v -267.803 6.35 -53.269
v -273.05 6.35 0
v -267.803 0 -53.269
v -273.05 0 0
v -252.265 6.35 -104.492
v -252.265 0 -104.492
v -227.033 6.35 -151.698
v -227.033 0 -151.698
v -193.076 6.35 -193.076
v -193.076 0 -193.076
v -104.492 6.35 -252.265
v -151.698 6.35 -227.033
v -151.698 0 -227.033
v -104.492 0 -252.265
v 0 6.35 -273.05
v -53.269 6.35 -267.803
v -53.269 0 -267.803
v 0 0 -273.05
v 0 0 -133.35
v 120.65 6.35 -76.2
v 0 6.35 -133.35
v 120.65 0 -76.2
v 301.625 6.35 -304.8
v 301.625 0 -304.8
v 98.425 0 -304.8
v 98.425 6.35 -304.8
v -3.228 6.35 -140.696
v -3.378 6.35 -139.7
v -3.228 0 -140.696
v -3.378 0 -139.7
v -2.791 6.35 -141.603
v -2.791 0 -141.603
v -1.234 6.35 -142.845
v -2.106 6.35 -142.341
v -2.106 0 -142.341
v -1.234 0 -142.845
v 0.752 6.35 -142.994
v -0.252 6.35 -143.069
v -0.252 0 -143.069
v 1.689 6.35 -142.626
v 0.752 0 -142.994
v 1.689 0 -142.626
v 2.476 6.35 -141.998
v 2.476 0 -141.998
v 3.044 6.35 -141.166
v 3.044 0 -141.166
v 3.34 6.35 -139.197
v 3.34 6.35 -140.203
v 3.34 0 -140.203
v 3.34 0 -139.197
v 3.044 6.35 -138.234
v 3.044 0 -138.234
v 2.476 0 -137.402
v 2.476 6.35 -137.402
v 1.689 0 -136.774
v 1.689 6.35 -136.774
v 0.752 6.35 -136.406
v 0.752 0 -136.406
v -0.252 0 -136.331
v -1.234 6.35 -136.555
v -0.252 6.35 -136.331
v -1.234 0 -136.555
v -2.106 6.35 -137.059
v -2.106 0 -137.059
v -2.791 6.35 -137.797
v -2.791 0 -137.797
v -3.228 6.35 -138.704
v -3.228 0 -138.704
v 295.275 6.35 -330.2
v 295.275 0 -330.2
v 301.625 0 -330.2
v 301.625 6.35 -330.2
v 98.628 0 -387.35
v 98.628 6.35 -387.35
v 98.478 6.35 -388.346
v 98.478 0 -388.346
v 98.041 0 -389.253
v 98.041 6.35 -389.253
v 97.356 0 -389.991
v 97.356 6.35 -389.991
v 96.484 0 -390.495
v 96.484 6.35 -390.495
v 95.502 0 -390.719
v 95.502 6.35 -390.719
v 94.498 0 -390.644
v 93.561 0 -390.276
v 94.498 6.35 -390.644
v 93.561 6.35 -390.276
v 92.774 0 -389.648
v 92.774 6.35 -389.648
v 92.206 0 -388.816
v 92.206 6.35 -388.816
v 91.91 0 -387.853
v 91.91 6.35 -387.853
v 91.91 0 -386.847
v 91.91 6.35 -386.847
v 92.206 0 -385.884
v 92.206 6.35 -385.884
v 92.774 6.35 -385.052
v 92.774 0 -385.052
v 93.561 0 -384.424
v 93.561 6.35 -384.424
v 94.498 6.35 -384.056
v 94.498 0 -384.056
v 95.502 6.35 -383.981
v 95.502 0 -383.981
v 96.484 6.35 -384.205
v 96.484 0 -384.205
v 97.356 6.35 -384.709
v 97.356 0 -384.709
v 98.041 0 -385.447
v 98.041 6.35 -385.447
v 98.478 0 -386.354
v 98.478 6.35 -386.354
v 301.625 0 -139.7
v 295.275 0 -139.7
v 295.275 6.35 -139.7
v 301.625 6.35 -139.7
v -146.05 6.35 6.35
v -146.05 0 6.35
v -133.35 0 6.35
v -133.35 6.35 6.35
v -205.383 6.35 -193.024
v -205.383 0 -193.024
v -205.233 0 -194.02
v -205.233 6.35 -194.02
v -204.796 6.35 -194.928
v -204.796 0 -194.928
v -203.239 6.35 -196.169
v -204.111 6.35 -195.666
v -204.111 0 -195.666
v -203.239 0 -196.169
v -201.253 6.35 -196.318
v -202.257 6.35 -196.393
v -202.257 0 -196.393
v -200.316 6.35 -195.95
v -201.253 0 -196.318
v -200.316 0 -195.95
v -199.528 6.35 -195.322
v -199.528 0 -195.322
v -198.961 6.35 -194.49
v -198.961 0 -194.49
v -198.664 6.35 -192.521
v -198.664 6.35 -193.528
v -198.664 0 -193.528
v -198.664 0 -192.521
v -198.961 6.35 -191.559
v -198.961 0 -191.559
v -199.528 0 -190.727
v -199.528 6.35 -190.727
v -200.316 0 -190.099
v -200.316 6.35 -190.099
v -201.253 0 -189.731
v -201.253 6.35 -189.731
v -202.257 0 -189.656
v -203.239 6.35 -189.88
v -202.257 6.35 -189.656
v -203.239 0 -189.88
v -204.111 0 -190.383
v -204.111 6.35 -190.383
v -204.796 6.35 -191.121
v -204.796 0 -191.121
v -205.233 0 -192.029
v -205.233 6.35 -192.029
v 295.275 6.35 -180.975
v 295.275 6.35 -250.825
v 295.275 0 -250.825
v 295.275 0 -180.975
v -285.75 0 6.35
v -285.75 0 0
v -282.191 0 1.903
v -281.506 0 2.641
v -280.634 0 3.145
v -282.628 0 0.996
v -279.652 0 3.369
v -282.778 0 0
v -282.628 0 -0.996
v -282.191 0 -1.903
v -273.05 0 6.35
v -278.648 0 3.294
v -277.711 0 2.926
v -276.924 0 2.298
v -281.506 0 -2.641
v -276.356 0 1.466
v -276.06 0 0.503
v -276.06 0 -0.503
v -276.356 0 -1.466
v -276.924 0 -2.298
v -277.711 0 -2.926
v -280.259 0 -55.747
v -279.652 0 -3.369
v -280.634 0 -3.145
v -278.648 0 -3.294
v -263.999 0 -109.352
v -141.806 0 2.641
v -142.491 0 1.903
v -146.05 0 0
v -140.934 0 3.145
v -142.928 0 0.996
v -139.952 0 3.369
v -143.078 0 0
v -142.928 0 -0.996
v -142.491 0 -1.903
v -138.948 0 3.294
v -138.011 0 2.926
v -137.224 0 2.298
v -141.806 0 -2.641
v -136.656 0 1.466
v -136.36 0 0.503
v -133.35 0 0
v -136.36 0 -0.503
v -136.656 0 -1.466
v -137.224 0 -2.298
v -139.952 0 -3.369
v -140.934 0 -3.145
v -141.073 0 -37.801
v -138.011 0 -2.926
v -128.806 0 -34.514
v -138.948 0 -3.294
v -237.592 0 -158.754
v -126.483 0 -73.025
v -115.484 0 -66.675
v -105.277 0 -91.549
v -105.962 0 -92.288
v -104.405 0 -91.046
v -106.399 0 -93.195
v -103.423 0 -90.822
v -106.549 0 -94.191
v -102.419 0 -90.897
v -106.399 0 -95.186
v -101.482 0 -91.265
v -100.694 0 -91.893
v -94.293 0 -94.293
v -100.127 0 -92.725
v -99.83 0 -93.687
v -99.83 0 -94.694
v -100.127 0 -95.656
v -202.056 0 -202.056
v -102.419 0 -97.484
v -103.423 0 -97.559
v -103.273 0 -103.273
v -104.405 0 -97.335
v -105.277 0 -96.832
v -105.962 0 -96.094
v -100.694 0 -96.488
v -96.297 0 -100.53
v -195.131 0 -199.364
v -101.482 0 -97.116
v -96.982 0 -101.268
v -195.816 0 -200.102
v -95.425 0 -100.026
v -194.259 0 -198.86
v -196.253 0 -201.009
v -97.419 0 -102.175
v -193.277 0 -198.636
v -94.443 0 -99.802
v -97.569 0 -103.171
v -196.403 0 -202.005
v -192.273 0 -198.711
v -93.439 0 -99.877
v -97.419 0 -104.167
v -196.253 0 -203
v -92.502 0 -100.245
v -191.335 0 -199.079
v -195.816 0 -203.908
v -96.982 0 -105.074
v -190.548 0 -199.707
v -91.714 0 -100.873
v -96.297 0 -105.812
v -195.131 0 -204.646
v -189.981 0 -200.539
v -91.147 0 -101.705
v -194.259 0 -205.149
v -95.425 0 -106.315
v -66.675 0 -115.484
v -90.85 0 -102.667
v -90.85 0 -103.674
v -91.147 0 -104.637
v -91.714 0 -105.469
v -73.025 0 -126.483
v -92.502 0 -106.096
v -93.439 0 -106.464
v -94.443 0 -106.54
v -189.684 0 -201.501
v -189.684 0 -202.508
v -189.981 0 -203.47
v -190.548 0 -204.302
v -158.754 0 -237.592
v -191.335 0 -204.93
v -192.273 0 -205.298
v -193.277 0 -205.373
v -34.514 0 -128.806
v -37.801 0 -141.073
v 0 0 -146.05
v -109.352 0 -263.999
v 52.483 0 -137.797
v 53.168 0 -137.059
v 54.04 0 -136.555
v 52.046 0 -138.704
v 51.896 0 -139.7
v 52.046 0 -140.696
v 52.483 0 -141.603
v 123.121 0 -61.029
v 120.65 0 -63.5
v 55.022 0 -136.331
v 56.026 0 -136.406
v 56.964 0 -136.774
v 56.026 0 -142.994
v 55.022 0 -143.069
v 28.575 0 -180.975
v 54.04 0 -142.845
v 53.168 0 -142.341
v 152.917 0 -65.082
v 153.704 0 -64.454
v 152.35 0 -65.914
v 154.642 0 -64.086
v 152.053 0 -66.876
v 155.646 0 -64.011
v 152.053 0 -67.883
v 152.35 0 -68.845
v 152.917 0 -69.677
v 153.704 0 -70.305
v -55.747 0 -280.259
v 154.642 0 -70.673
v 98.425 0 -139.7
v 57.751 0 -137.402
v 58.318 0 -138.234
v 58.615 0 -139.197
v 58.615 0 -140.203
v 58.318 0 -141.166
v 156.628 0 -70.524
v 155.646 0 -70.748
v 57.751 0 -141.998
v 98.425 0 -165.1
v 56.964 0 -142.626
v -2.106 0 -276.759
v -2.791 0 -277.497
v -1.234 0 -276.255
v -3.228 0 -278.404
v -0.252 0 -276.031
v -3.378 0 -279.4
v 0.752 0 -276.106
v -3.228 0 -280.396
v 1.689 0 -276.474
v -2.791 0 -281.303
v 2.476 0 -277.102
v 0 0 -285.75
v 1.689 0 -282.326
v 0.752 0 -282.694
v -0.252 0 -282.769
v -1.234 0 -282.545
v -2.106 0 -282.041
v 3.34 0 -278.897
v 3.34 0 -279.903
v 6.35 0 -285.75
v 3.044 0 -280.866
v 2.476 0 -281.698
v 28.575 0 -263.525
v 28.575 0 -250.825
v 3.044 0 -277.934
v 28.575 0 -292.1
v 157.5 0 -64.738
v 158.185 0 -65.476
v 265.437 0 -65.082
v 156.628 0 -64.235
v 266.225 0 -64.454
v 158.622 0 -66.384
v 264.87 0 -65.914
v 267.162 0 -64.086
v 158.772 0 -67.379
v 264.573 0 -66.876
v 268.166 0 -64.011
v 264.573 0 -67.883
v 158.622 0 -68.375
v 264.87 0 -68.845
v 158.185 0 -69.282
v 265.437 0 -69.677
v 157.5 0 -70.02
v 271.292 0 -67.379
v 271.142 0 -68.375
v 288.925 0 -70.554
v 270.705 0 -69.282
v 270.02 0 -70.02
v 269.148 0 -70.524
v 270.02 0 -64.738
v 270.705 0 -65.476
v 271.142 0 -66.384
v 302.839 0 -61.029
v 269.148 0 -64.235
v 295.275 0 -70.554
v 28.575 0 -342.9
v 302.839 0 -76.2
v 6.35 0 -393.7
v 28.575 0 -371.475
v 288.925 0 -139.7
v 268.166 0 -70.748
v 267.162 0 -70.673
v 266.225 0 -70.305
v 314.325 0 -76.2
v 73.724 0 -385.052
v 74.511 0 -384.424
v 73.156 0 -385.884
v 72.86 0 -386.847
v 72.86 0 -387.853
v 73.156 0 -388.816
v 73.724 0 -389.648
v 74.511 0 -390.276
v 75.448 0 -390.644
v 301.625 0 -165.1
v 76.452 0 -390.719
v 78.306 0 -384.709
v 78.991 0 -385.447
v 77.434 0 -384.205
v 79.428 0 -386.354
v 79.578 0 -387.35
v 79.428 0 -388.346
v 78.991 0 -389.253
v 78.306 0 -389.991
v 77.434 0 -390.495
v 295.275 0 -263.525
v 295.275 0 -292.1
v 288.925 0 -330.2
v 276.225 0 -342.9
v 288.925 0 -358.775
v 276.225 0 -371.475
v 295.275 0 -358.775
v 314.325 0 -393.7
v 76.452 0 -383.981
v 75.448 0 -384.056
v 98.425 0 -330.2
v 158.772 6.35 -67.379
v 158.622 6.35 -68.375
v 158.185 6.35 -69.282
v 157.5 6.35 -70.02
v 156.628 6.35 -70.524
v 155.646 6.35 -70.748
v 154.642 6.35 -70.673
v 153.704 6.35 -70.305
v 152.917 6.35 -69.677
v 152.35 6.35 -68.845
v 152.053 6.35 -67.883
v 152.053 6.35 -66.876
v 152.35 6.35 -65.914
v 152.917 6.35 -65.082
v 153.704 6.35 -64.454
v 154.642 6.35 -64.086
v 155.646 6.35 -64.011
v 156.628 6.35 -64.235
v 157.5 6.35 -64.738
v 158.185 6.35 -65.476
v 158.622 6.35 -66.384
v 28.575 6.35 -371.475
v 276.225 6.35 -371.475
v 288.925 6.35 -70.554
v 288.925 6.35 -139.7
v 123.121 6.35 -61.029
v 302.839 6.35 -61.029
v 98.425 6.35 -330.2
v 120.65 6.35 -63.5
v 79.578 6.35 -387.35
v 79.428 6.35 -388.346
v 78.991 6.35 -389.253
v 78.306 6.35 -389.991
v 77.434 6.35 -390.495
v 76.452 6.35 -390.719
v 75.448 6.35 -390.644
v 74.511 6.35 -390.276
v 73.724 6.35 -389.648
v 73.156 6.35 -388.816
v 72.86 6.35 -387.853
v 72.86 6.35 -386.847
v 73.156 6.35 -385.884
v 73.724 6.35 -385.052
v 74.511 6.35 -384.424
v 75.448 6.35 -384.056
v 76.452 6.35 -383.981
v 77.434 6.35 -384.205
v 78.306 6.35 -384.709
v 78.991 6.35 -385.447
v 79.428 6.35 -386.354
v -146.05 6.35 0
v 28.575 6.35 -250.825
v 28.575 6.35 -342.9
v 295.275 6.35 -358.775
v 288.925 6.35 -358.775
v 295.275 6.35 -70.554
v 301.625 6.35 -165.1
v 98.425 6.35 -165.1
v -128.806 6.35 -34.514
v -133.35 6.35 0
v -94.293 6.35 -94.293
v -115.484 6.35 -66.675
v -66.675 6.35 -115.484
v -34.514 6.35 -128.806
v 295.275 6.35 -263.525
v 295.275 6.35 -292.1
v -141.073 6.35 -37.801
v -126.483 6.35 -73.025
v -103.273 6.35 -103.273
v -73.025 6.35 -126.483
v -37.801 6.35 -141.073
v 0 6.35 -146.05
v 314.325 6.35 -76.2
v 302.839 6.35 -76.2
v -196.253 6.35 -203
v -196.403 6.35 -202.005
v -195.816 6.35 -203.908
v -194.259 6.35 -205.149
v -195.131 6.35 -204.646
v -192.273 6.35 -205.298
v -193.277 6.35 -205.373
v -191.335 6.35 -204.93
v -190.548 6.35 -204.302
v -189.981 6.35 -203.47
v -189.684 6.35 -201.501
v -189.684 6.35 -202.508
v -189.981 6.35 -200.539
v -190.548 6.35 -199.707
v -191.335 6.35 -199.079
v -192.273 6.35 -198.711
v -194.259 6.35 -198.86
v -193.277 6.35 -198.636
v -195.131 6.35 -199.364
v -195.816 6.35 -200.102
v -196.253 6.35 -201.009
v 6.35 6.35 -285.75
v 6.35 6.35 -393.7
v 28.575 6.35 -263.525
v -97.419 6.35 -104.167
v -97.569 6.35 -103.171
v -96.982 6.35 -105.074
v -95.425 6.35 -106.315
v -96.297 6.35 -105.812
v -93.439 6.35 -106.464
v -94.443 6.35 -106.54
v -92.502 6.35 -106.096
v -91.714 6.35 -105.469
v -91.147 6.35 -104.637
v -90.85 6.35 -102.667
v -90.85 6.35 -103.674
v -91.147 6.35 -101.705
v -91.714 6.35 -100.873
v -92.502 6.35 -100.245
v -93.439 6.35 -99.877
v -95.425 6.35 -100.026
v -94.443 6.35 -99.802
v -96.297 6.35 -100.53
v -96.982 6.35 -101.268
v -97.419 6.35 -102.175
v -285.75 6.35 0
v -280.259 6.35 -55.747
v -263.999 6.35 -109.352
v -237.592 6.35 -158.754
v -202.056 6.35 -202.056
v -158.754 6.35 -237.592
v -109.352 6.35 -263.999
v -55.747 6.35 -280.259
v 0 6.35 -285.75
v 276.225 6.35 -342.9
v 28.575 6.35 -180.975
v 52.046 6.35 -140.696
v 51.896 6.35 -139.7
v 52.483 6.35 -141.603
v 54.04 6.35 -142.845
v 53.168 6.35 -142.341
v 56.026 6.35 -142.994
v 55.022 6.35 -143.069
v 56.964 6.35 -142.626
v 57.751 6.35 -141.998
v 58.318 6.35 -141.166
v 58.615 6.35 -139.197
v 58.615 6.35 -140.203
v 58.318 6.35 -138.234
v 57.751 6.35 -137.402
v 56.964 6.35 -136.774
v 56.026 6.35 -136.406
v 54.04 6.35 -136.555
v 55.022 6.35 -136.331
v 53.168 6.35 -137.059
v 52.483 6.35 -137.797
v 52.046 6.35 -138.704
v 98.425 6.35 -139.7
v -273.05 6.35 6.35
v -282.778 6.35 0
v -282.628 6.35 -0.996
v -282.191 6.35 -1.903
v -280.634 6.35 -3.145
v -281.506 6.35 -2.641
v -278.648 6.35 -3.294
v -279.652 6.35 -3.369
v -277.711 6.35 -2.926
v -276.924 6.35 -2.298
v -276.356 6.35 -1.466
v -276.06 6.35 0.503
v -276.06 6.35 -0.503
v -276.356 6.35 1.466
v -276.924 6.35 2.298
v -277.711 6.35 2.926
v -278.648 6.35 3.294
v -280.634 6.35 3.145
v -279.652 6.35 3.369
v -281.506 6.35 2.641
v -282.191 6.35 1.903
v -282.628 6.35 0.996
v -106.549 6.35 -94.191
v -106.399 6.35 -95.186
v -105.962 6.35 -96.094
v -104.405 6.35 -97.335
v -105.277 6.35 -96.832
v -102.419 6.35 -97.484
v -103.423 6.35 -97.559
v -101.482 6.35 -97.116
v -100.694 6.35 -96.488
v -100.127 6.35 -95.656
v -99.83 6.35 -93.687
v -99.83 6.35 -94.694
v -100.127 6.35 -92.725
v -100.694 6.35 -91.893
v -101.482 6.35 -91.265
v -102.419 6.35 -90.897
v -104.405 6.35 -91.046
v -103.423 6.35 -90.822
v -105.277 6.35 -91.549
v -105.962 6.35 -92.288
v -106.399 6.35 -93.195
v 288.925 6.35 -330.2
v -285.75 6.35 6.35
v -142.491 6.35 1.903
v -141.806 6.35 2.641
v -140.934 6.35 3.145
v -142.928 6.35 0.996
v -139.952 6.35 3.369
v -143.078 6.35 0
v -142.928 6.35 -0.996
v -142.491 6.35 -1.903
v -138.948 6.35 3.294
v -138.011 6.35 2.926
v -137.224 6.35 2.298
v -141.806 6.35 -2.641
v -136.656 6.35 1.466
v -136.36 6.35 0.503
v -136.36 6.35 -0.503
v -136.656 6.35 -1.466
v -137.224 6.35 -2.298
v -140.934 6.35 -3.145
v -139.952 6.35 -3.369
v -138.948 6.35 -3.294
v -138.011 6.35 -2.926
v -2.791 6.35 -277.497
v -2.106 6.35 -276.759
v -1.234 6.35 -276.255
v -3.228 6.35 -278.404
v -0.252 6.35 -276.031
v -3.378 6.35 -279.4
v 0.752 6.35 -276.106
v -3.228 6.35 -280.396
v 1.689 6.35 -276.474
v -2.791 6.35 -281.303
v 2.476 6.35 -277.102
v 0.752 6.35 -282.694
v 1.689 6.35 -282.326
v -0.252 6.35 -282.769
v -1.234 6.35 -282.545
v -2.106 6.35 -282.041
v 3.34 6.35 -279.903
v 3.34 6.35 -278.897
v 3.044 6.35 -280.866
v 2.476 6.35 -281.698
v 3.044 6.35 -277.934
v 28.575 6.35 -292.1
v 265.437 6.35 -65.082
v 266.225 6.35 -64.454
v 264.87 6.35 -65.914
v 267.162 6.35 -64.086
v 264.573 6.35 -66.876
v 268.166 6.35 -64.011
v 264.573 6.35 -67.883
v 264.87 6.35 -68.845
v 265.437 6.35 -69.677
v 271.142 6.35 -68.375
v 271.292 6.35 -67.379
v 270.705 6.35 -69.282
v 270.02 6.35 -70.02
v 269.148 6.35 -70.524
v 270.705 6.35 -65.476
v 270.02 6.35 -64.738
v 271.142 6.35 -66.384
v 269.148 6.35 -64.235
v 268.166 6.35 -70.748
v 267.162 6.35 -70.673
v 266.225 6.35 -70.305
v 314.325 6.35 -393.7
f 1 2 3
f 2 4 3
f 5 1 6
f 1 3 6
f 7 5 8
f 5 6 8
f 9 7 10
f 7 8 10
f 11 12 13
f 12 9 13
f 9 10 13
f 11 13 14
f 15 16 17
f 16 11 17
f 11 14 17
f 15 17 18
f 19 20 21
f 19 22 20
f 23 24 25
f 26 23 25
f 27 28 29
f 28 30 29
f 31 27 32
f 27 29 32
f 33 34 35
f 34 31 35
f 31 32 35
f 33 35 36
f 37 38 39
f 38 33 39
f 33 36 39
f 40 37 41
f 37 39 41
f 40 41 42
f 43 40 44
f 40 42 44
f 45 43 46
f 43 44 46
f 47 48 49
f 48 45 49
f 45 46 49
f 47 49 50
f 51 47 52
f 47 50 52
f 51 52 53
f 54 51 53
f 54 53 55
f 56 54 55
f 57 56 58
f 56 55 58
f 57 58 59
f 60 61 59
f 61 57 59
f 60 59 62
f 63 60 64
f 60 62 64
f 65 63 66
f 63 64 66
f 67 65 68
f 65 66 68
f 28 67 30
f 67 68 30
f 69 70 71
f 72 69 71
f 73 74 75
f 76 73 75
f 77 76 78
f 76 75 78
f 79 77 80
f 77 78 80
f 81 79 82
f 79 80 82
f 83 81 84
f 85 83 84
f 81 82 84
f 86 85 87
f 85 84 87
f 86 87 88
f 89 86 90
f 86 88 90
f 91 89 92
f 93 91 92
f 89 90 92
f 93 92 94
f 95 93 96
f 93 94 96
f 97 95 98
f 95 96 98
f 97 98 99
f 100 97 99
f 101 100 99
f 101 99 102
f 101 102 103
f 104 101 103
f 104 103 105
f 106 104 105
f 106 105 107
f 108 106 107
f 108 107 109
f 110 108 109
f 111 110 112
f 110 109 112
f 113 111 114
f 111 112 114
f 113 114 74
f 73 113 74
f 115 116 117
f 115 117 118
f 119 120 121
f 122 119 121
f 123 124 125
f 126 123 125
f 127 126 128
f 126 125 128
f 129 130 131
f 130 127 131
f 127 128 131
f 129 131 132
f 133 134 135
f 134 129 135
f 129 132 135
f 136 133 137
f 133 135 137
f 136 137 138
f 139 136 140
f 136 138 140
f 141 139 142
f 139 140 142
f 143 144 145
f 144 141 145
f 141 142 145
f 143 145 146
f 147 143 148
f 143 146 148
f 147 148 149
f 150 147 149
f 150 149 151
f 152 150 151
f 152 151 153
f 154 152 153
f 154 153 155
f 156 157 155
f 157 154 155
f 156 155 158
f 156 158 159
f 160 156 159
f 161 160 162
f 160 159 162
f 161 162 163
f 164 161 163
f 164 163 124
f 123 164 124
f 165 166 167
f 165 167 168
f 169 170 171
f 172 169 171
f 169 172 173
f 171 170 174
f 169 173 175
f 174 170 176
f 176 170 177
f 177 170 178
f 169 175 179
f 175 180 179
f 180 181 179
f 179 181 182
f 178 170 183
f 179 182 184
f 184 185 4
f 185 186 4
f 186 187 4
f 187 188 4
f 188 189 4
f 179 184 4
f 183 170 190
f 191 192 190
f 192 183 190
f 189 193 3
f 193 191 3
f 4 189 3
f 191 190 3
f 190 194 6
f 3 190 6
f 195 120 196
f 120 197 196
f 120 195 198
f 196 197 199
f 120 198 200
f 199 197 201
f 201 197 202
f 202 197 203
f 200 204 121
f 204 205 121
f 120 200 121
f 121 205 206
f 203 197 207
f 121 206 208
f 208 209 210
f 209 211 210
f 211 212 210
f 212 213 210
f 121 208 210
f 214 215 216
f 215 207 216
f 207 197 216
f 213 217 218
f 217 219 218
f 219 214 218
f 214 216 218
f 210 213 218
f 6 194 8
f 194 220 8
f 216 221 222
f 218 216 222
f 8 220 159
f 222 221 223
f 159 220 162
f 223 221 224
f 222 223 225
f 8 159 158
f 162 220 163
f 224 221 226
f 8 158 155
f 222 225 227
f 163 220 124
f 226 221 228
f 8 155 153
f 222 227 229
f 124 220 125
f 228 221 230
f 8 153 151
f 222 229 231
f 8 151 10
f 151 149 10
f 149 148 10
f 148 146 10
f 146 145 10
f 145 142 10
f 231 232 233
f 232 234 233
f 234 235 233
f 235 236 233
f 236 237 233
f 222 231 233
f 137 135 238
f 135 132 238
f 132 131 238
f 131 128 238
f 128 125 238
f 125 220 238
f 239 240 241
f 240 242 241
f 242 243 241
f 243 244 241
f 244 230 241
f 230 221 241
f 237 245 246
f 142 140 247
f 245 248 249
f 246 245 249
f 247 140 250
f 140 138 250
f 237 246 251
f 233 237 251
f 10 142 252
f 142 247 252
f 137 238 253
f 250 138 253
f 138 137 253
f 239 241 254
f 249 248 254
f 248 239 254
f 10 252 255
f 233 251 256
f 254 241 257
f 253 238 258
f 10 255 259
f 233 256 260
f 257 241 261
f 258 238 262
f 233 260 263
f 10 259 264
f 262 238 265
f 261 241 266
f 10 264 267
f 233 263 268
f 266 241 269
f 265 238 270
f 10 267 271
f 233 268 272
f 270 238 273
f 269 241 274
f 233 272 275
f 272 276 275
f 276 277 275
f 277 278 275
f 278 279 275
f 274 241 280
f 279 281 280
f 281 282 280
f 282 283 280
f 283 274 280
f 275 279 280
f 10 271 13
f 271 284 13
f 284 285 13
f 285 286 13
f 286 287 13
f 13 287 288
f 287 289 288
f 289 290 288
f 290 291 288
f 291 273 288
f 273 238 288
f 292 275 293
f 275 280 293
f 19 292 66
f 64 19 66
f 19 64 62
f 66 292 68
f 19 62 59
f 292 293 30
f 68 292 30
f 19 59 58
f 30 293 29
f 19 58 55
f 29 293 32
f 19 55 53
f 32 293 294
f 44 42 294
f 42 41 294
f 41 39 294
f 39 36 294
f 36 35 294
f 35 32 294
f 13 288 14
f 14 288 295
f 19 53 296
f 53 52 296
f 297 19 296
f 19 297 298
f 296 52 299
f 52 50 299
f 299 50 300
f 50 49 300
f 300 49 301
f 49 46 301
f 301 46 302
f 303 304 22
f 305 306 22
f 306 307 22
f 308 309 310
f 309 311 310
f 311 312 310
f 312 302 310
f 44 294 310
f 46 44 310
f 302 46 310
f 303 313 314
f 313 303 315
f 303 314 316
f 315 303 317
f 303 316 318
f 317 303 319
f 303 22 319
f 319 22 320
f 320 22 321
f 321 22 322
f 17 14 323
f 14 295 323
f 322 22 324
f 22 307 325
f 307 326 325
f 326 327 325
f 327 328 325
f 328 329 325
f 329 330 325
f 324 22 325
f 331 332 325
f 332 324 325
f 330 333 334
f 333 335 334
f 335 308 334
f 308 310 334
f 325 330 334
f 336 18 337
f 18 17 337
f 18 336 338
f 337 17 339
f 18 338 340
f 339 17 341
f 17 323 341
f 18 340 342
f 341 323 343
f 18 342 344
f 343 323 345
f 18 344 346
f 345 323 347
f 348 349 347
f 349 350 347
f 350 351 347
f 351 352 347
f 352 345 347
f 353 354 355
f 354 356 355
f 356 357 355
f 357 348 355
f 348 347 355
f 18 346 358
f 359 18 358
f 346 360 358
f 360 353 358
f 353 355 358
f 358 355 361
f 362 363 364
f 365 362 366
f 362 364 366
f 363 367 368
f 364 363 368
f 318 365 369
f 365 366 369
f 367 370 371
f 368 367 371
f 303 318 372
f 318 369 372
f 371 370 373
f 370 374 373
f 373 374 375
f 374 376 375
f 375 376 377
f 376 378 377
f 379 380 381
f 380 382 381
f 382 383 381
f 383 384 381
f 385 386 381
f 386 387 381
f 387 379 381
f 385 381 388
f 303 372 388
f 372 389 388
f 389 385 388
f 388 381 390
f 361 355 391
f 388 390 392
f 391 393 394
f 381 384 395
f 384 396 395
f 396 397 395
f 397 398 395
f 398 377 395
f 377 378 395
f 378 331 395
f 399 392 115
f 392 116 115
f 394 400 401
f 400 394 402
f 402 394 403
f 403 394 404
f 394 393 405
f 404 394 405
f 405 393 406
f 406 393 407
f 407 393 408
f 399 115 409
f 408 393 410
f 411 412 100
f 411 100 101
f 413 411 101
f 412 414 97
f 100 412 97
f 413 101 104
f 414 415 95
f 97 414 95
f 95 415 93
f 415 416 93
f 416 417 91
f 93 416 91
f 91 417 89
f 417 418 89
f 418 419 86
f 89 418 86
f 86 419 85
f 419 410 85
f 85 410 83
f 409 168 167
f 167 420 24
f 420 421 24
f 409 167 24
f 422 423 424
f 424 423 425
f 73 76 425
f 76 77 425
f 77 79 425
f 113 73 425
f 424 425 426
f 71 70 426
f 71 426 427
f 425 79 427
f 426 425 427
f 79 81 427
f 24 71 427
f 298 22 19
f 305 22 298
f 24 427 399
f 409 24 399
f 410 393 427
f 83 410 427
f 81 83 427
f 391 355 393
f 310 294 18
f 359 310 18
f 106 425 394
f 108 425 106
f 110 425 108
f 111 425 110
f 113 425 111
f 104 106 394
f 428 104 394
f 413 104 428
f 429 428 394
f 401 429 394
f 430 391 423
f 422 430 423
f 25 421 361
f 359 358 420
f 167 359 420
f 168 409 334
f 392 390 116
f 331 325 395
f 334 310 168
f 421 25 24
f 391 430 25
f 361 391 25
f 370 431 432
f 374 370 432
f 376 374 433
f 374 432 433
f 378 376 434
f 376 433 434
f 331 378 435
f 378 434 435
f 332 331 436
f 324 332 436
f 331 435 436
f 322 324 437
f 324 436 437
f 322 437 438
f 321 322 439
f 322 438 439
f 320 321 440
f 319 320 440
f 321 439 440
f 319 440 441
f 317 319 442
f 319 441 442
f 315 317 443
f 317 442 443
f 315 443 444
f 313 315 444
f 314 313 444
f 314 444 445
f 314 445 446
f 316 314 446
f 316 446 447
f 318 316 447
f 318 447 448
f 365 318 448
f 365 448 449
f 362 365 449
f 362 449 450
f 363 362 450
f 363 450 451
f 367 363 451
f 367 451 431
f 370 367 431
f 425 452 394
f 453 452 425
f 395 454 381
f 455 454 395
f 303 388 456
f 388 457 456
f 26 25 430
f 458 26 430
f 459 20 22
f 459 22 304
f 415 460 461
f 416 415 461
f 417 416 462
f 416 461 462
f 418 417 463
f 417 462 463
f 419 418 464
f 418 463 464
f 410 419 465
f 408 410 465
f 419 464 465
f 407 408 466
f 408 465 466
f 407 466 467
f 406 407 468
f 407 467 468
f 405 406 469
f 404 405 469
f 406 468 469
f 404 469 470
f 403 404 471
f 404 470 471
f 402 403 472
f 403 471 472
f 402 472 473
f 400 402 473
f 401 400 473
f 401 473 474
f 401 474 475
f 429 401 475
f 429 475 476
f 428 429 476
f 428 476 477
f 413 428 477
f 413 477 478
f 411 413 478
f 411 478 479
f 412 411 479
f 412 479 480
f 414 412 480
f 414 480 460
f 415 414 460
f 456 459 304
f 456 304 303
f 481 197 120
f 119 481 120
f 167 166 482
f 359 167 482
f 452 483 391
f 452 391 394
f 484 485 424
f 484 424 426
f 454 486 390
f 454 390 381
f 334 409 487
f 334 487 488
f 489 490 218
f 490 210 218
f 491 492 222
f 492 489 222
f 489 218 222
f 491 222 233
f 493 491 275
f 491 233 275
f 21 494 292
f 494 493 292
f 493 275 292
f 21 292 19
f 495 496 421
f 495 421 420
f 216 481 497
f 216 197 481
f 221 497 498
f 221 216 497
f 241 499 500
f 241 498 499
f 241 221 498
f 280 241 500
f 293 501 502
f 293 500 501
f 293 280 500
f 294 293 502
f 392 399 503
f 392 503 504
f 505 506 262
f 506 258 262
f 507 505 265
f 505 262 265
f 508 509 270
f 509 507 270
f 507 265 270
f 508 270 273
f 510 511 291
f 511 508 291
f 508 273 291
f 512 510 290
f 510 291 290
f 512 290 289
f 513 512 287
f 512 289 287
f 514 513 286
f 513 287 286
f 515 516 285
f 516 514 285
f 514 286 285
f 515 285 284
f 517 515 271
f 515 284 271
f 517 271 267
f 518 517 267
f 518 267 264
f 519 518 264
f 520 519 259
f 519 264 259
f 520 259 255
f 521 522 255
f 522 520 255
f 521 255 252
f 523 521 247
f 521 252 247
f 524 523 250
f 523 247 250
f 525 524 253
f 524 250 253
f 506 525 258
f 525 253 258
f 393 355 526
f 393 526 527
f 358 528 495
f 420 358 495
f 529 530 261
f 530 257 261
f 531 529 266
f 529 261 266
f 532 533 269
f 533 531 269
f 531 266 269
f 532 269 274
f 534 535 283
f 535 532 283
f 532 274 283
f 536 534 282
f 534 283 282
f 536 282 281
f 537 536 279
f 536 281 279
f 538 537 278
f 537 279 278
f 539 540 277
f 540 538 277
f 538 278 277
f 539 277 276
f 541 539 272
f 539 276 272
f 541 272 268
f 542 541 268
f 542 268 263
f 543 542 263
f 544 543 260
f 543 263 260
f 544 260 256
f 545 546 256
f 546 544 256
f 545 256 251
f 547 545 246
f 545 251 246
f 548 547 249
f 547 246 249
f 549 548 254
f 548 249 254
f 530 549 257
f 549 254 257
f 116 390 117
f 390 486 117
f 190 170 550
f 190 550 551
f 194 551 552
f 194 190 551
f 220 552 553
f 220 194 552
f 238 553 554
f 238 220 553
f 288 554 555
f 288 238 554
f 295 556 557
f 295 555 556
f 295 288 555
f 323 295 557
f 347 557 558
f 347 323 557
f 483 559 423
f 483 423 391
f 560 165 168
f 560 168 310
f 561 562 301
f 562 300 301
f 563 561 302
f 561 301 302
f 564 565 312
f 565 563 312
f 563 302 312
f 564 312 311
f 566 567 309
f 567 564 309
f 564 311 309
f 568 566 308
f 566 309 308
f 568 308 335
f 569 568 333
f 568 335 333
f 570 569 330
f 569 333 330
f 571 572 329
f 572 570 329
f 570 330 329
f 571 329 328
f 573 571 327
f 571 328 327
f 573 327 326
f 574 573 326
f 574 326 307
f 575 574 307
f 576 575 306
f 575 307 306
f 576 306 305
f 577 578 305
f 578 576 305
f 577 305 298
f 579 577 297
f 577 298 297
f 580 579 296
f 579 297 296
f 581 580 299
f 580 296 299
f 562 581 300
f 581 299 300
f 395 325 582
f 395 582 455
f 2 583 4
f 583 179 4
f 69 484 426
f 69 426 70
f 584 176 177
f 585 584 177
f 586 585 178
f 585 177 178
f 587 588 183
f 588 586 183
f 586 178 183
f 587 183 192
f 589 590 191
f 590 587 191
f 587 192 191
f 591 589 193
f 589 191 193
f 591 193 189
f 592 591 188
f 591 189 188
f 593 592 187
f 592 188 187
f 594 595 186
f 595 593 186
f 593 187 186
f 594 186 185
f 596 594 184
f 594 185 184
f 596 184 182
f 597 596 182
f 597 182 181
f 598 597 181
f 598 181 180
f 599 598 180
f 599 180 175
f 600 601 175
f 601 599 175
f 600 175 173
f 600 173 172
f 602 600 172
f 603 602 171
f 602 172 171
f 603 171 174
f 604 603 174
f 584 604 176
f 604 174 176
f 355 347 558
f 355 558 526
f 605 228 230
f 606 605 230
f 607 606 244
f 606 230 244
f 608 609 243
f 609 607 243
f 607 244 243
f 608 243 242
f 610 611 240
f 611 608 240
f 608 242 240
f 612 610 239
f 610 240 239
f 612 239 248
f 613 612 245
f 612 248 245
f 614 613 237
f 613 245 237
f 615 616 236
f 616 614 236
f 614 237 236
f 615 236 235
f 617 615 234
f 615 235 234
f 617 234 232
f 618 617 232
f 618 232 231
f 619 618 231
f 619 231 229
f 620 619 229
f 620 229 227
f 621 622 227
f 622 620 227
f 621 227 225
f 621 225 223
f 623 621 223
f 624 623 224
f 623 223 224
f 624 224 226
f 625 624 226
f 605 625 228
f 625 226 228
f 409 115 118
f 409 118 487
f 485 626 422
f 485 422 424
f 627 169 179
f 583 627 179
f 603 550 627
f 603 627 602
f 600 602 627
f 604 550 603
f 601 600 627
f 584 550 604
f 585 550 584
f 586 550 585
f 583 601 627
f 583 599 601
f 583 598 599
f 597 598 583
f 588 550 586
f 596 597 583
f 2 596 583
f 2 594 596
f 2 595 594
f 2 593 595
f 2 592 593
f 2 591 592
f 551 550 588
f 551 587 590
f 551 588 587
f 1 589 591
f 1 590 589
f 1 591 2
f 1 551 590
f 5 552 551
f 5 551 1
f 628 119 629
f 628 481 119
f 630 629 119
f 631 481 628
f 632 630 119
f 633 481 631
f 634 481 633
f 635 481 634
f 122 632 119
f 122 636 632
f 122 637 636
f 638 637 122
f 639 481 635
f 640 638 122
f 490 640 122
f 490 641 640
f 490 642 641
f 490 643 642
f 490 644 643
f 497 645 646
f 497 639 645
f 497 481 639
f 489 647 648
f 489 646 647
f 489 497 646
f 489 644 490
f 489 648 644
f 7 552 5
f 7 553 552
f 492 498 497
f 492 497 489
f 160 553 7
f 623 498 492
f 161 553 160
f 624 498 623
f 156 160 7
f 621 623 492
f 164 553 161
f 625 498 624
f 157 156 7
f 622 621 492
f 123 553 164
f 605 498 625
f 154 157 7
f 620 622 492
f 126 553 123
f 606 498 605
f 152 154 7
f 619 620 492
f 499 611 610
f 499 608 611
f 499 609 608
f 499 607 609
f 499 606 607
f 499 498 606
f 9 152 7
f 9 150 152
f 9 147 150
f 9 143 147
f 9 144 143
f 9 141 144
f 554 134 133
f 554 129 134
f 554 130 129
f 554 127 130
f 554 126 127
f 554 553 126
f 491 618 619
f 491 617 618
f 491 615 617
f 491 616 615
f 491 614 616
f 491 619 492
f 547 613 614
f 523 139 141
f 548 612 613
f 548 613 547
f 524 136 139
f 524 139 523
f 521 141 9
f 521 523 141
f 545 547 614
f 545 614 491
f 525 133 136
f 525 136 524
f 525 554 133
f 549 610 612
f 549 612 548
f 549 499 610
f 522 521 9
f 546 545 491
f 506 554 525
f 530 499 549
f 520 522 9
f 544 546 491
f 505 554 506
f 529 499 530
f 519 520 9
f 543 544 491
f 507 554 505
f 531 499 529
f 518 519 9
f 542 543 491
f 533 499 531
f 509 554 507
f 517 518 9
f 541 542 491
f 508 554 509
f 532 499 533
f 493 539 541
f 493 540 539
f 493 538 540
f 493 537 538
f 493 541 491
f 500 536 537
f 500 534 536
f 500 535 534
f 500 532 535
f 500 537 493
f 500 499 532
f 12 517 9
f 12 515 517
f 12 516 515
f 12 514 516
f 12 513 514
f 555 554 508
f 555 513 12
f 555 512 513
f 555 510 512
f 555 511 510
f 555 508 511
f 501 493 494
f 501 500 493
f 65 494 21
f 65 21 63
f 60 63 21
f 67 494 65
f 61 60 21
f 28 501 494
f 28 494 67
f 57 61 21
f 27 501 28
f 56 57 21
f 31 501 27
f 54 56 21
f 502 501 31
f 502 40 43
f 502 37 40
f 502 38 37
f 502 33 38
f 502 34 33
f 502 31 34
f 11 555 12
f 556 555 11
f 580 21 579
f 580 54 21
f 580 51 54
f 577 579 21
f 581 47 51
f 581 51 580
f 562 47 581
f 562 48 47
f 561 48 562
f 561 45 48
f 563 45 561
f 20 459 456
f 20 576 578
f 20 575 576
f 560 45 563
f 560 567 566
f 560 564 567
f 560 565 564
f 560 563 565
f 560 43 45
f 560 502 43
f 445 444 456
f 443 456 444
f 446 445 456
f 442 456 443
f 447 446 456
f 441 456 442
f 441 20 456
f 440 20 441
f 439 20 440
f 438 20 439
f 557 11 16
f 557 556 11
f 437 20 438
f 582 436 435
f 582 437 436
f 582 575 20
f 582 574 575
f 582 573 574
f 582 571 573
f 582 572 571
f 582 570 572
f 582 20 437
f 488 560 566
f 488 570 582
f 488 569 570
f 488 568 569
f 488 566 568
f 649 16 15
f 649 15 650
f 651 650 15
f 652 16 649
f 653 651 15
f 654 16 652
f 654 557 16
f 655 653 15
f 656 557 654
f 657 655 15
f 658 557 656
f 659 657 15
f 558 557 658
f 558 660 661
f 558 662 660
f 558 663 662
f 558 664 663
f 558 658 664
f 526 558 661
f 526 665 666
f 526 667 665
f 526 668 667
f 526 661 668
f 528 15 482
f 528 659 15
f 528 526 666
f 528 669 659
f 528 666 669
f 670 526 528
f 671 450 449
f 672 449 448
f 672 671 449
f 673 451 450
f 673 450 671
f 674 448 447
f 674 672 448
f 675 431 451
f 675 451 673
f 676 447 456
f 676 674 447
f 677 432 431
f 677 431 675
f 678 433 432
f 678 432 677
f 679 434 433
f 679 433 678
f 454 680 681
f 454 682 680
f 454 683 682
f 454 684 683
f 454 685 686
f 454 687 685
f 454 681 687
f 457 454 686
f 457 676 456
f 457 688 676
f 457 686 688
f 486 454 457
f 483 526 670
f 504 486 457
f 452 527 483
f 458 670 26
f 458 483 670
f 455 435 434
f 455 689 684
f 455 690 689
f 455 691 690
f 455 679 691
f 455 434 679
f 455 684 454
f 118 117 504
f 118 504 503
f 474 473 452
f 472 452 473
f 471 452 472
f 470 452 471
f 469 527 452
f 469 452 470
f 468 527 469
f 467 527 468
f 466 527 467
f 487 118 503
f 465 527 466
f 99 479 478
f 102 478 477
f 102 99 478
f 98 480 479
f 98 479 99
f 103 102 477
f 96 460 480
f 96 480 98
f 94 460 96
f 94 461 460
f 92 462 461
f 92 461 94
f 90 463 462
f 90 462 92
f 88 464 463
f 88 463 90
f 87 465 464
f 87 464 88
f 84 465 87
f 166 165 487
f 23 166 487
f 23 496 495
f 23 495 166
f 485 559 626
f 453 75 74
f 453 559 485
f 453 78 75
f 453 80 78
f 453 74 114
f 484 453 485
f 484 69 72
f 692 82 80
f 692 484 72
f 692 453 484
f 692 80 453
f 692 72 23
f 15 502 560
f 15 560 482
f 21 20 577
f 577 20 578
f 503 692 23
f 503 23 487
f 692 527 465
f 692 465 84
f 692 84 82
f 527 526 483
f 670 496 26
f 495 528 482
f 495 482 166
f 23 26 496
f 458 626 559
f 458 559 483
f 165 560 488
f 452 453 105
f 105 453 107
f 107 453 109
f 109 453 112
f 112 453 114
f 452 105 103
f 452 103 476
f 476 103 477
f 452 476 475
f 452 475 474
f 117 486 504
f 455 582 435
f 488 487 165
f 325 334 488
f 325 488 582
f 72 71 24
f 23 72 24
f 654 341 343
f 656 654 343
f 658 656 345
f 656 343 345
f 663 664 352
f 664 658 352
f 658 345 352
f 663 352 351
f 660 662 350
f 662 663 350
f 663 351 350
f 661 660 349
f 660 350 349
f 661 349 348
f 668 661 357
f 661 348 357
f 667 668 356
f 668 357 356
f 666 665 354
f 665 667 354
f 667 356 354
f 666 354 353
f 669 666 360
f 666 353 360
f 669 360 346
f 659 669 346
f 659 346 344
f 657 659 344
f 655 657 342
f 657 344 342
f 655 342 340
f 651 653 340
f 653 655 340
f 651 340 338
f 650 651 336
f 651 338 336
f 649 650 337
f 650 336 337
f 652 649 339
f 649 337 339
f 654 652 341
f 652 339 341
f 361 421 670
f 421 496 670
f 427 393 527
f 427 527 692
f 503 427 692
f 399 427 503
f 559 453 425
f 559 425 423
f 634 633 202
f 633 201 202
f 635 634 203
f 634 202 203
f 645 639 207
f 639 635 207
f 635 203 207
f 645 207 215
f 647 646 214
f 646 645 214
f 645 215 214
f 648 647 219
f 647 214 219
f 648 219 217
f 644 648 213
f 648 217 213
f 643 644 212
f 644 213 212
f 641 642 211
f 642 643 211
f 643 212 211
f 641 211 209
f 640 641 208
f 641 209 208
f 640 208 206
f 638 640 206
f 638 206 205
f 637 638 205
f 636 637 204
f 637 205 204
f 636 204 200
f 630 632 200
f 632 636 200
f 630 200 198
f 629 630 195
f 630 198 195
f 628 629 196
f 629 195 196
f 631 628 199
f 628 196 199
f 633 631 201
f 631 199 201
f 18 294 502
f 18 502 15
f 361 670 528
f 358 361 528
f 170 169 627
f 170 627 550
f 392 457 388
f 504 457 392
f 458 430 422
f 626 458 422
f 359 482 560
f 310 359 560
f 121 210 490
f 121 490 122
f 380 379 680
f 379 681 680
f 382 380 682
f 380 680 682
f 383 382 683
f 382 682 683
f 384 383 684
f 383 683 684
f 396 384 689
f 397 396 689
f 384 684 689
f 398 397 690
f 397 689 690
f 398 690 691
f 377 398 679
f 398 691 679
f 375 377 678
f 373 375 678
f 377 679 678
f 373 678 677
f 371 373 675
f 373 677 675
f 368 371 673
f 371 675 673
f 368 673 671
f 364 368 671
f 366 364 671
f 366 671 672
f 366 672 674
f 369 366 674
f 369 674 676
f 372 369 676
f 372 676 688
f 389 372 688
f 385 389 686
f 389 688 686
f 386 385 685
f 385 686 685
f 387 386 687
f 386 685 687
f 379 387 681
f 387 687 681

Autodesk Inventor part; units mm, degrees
ref_plane "YZ Plane" through (0, 0, 0) normal (1, 0, 0) x (0, 1, 0)
ref_plane "XZ Plane" through (0, 0, 0) normal (0, 1, 0) x (-1, 0, 0)
ref_plane "XY Plane" through (0, 0, 0) normal (0, 0, 1) x (1, 0, 0)
sketch "Sketch1" plane through (0, 0, 0) normal (0, 1, 0) x (-1, 0, 0)
  arc A0 (0, -273.05) -> (273.05, 0) centre (0, 0) ccw
  arc A1 (0, -285.75) -> (285.75, 0) centre (0, 0) ccw
  arc A2 (0, -146.05) -> (146.05, 0) centre (0, 0) ccw
  arc A3 (0, -133.35) -> (133.35, 0) centre (0, 0) ccw
  line L0 (0, -285.75) -> (-6.35, -285.75)
  line L1 (146.05, 0) -> (146.05, 6.35)
  line L2 (133.35, 0) -> (133.35, 6.35)
  line L3 (273.05, 6.35) -> (273.05, 0)
  line L4 (285.75, 6.35) -> (285.75, 0)
  circle A4 centre (103.1708, -94.1906) radius 3.3782
  circle A5 centre (94.1906, -103.1708) radius 3.3782
  circle A6 centre (279.4, 0) radius 3.3782
  circle A7 centre (139.7, 0) radius 3.3782
  circle A8 centre (202.0047, -193.0245) radius 3.3782
  circle A9 centre (193.0245, -202.0047) radius 3.3782
  circle A10 centre (0, -279.4) radius 3.3782
  circle A11 centre (0, -139.7) radius 3.3782
  circle A12 centre (-55.2746, -139.7) radius 3.3782
  circle A13 centre (-78.3684, -279.4) radius 3.3782
  line L5 (285.75, 6.35) -> (273.05, 6.35)
  line L6 (146.05, 6.35) -> (133.35, 6.35)
  line L7 (-314.96, -285.75) -> (-314.96, -273.05)
  line L8 (-101.6, -133.35) -> (-127, -133.35)
  line L9 (-127, -146.05) -> (-101.6, -146.05)
  line L10 (-314.96, -146.05) -> (-314.96, -133.35)
  line L11 (-6.35, -285.75) -> (-6.35, -393.7)
  line L12 (-6.35, -393.7) -> (-314.325, -393.7)
  line L13 (-314.325, -393.7) -> (-314.325, -76.2)
  line L14 (-314.325, -76.2) -> (-120.65, -76.2)
  line L15 (-120.65, -76.2) -> (0, -133.35)
  line L16 (0, -285.75) -> (-6.35, -285.75)
  line L17 (0, -146.05) -> (0, -273.05)
  dimension "d10" = 12.7
  dimension "d11" = 12.7
  dimension "d13" = 12.7
  dimension "d14" = 6.7564
  dimension "d15" = 6.7564
  dimension "d16" = 6.7564
  dimension "d18" = 6.7564
  dimension "d20" = 6.35
  dimension "d21" = 6.7564
  dimension "d22" = 6.7564
  dimension "d23" = 6.7564
  dimension "d26" = 6.7564
  dimension "d30" = 6.7564
  dimension "d32" = 6.7564
  dimension "d66" = 25.4
  dimension "d67" = 0
  dimension "d72" = 12.7
  dimension "d81" = 107.95
  dimension "d82" = 133.35
  dimension "d83" = 279.4
  dimension "d84" = 6.35
  dimension "d85" = 317.5
  dimension "d86" = 193.675
  dimension "d87" = 55.2746
  dimension "d88" = 139.7
  dimension "d91" = 307.975
extrude "Extrusion7" add sketch "Sketch1" along normal blind 6.35
sketch "Sketch7" plane through (0, 0, 0) normal (0, -1, 0) x (1, 0, 0)
  line L0 (0, -273.05) -> (0, -146.05) projected
  line L1 (314.325, -76.2) -> (314.325, -393.7) projected
  line L2 (314.325, -234.95) -> (0, -234.95)
  line L3 (301.625, -139.7) -> (301.625, -165.1)
  line L4 (301.625, -165.1) -> (98.425, -165.1)
  line L5 (98.425, -165.1) -> (98.425, -139.7)
  line L6 (98.425, -139.7) -> (301.625, -139.7)
  line L7 (301.625, -330.2) -> (301.625, -304.8)
  line L8 (301.625, -304.8) -> (98.425, -304.8)
  line L9 (98.425, -304.8) -> (98.425, -330.2)
  line L10 (98.425, -330.2) -> (301.625, -330.2)
  dimension "d92" = 25.4
  dimension "d93" = 203.2
  dimension "d94" = 12.7
  dimension "d95" = 69.85
extrude "Extrusion8" cut sketch "Sketch7" against normal blind 6.35
sketch "Sketch8" plane through (0, 6.35, 0) normal (0, 1, 0) x (1, 0, 0)
  line L0 (98.425, 165.1) -> (301.625, 165.1) projected
  line L1 (301.625, 304.8) -> (98.425, 304.8) projected
  circle A0 centre (78.3684, 279.4) radius 3.3782 projected
  line L2 (314.325, 76.2) -> (314.325, 393.7) projected
  line L3 (314.325, 393.7) -> (6.35, 393.7) projected
  line L4 (0, 273.05) -> (0, 146.05) projected
  line L5 (295.275, 367.3082) -> (295.275, 342.9)
  line L6 (295.275, 342.9) -> (28.575, 342.9)
  line L7 (28.575, 342.9) -> (28.575, 371.475)
  line L8 (28.575, 371.475) -> (295.275, 371.475)
  line L9 (295.275, 371.475) -> (295.275, 367.3082)
  line L10 (295.275, 292.1) -> (28.575, 292.1)
  line L11 (28.575, 292.1) -> (28.575, 263.525)
  line L12 (28.575, 263.525) -> (295.275, 263.525)
  line L13 (295.275, 263.525) -> (295.275, 292.1)
  line L14 (295.275, 250.825) -> (28.575, 250.825)
  line L15 (28.575, 250.825) -> (28.575, 222.25)
  line L16 (28.575, 222.25) -> (295.275, 222.25)
  line L17 (295.275, 222.25) -> (295.275, 250.825)
  line L18 (295.275, 209.55) -> (295.275, 180.975)
  line L19 (295.275, 180.975) -> (28.575, 180.975)
  line L20 (28.575, 180.975) -> (28.575, 209.55)
  line L21 (28.575, 209.55) -> (295.275, 209.55)
  dimension "d100" = 90
  dimension "d101" = 22.225
  dimension "d102" = 19.05
  dimension "d103" = 28.575
  dimension "d104" = 266.7
  dimension "d105" = 28.575
  dimension "d106" = 19.05
  dimension "d107" = 12.7
  dimension "d108" = 266.7
  dimension "d109" = 28.575
  dimension "d110" = 28.575
  dimension "d111" = 12.7
  dimension "d112" = 12.7
  dimension "d113" = 266.7
  dimension "d114" = 19.05
  dimension "d115" = 19.05
extrude "Extrusion9" cut sketch "Sketch8" against normal blind 25.4
sketch "Sketch9" plane through (0, 6.35, 0) normal (0, 1, 0) x (1, 0, 0)
  line L0 (314.325, 76.2) -> (314.325, 393.7) projected
  line L1 (295.275, 371.475) -> (295.275, 88.9)
  line L2 (295.275, 88.9) -> (288.925, 88.9)
  line L3 (288.925, 88.9) -> (288.925, 381)
  line L4 (288.925, 381) -> (295.275, 381)
  line L5 (295.275, 381) -> (295.275, 371.475)
  dimension "d118" = 282.575
  dimension "d119" = 6.35
  dimension "d120" = 292.1
extrude "Extrusion10" cut sketch "Sketch9" against normal blind 25.4
sketch "Sketch10" plane through (0, 6.35, 0) normal (0, 1, 0) x (1, 0, 0)
  line L0 (120.65, 76.2) -> (314.325, 76.2) projected
  line L1 (0, 273.05) -> (0, 146.05) projected
  line L2 (120.65, 76.2) -> (120.65, 63.5)
  line L3 (120.65, 63.5) -> (145.3457, 38.8043)
  line L4 (145.3457, 38.8043) -> (302.8387, 38.8043)
  line L5 (302.8387, 38.8043) -> (302.8387, 76.2)
  dimension "d123" = 12.7
  dimension "d124" = 34.925
  dimension "d125" = 135
extrude "Extrusion11" add sketch "Sketch10" against normal blind 6.35
sketch "Sketch13" plane through (0, 6.35, 0) normal (0, 1, 0) x (1, 0, 0)
  line L0 (288.925, 88.9) -> (288.925, 139.7) projected
  line L1 (288.925, 139.7) -> (98.425, 139.7) projected
  line L2 (288.925, 381) -> (295.275, 381) projected
  line L3 (295.275, 88.9) -> (288.925, 88.9) projected
  line L4 (145.3457, 38.8043) -> (302.8387, 38.8043) projected
  line L5 (302.8387, 38.8043) -> (302.8387, 76.2) projected
  line L6 (0, 273.05) -> (0, 146.05) projected
  line L7 (98.425, 127) -> (98.425, 101.6)
  line L8 (98.425, 101.6) -> (288.925, 101.6)
  line L9 (98.425, 127) -> (288.925, 127)
  line L10 (288.925, 88.9) -> (288.925, 44.45)
  line L11 (288.925, 44.45) -> (295.275, 44.45)
  line L12 (295.275, 44.45) -> (295.275, 88.9)
  dimension "d135" = 25.4
  dimension "d136" = 336.55
  dimension "d137" = 12.7
extrude "Extrusion13" cut sketch "Sketch13" against normal blind 25.4
sketch "Sketch14" plane through (0, 6.35, 0) normal (0, 1, 0) x (1, 0, 0)
  line L0 (311.15, 79.375) -> (304.8, 79.375) projected
  line L1 (304.8, 79.375) -> (304.8, 85.725) projected
  line L2 (304.8, 85.725) -> (311.15, 85.725) projected
  line L3 (311.15, 85.725) -> (311.15, 79.375) projected
  line L4 (6.35, 381) -> (301.625, 381) projected
  line L5 (301.625, 381) -> (301.625, 76.2) projected
  line L6 (301.625, 76.2) -> (314.325, 76.2) projected
  line L7 (314.325, 76.2) -> (314.325, 393.7) projected
  line L8 (314.325, 393.7) -> (6.35, 393.7) projected
  line L9 (6.35, 393.7) -> (6.35, 381) projected
  line L10 (311.15, 390.525) -> (311.15, 384.175) projected
  line L11 (311.15, 384.175) -> (304.8, 384.175) projected
  line L12 (304.8, 384.175) -> (304.8, 390.525) projected
  line L13 (304.8, 390.525) -> (311.15, 390.525) projected
  line L14 (15.875, 384.175) -> (9.525, 384.175) projected
  line L15 (9.525, 384.175) -> (9.525, 390.525) projected
  line L16 (9.525, 390.525) -> (15.875, 390.525) projected
  line L17 (15.875, 390.525) -> (15.875, 384.175) projected
  line L18 (145.3457, 38.8043) -> (302.8387, 38.8043) projected
  line L19 (301.625, 139.7) -> (295.275, 139.7) projected
  line L20 (152.2186, 54.6793) -> (152.2186, 48.3293)
  line L21 (152.2186, 48.3293) -> (158.5686, 48.3293)
  line L22 (158.5686, 48.3293) -> (158.5686, 54.6793)
  line L23 (158.5686, 54.6793) -> (152.2186, 54.6793)
  dimension "d146" = 6.35
  dimension "d148" = 6.35
  dimension "d149" = 9.525
extrude "Extrusion15" cut sketch "Sketch14" against normal blind 25.4 contours L23 L22 L21 L20
sketch "Sketch16" plane through (0, 6.35, 0) normal (0, 1, 0) x (1, 0, 0)
  line L0 (288.925, 165.1) -> (288.925, 180.975) projected
  line L1 (288.925, 209.55) -> (288.925, 222.25) projected
  line L2 (288.925, 250.825) -> (288.925, 263.525) projected
  line L3 (288.925, 292.1) -> (288.925, 304.8) projected
  line L4 (295.275, 304.8) -> (295.275, 165.1) projected
  line L5 (295.275, 165.1) -> (301.625, 165.1) projected
  line L6 (288.925, 165.1) -> (295.275, 165.1)
  line L7 (288.925, 180.975) -> (295.275, 180.975)
  line L8 (288.925, 222.25) -> (295.275, 222.25)
  line L9 (288.925, 209.55) -> (295.275, 209.55)
  line L10 (288.925, 304.8) -> (295.275, 304.8)
  line L11 (288.925, 292.1) -> (295.275, 292.1)
  line L12 (288.925, 263.525) -> (295.275, 263.525)
  line L13 (288.925, 250.825) -> (295.275, 250.825)
extrude "Extrusion16" add sketch "Sketch16" against normal blind 6.35
sketch "Sketch17" plane through (0, 6.35, 0) normal (0, 1, 0) x (1, 0, 0)
  line L0 (288.925, 44.45) -> (288.925, 101.6) projected
  line L1 (288.925, 101.6) -> (98.425, 101.6) projected
  line L2 (98.425, 127) -> (288.925, 127) projected
  line L3 (288.925, 342.9) -> (28.575, 342.9) projected
  line L4 (28.575, 371.475) -> (288.925, 371.475) projected
  line L5 (288.925, 127) -> (288.925, 101.6)
  line L6 (276.225, 127) -> (276.225, 101.6)
  line L7 (288.925, 342.9) -> (288.925, 371.475)
  line L8 (276.225, 371.475) -> (276.225, 342.9)
  dimension "d155" = 12.7
  dimension "d156" = 12.7
extrude "Extrusion17" add sketch "Sketch17" against normal blind 6.35
sketch "Sketch18" plane through (0, 6.35, 0) normal (0, 1, 0) x (1, 0, 0)
  line L0 (288.925, 44.45) -> (288.925, 139.7) projected
  line L1 (295.275, 139.7) -> (295.275, 44.45) projected
  line L2 (295.275, 44.45) -> (288.925, 44.45) projected
  line L3 (145.3457, 38.8043) -> (302.8387, 38.8043) projected
  line L4 (295.275, 70.5543) -> (288.925, 70.5543)
  dimension "d159" = 31.75
extrude "Extrusion18" add sketch "Sketch18" against normal blind 6.35
sketch "Sketch19" plane through (0, 6.35, 0) normal (0, 1, 0) x (1, 0, 0)
  line L0 (314.325, 393.7) -> (6.35, 393.7) projected
  line L1 (6.35, 393.7) -> (6.35, 285.75) projected
  circle A0 centre (76.2, 387.35) radius 3.3782
  dimension "d162" = 6.7564
  dimension "d164" = 6.35
  dimension "d165" = 69.85
extrude "Extrusion19" cut sketch "Sketch19" against normal blind 25.4
sketch "Sketch20" plane through (0, 6.35, 0) normal (0, 1, 0) x (1, 0, 0)
  circle A0 centre (95.25, 387.35) radius 3.3782 projected
extrude "Extrusion20" cut sketch "Sketch20" against normal blind 25.4
sketch "Sketch21" plane through (0, 6.35, 0) normal (0, 1, 0) x (1, 0, 0)
  line L0 (158.5686, 54.6793) -> (158.5686, 48.3293) projected
  line L1 (145.3457, 38.8043) -> (302.8387, 38.8043) projected
  line L2 (302.8387, 38.8043) -> (302.8387, 76.2) projected
  circle A0 centre (155.3936, 67.3793) radius 3.3782
  circle A1 centre (267.9137, 67.3793) radius 3.3782
  dimension "d170" = 6.7564
  dimension "d171" = 6.7564
  dimension "d172" = 28.575
  dimension "d173" = 34.925
  dimension "d174" = 28.575
  dimension "d176" = 3.175
extrude "Extrusion21" cut sketch "Sketch21" against normal blind 25.4
sketch "Sketch22" plane through (0, 6.35, 0) normal (0, 1, 0) x (1, 0, 0)
  line L0 (288.925, 330.2) -> (288.925, 381) projected
  line L1 (288.925, 381) -> (295.275, 381) projected
  line L2 (295.275, 381) -> (295.275, 330.2) projected
  line L3 (288.925, 358.775) -> (295.275, 358.775)
  dimension "d179" = 22.225
extrude "Extrusion22" add sketch "Sketch22" against normal blind 6.35
sketch "Sketch23" plane through (0, 6.35, 0) normal (0, 1, 0) x (1, 0, 0)
  line L0 (158.5686, 48.3293) -> (152.2186, 48.3293) projected
  line L1 (152.2186, 48.3293) -> (152.2186, 54.6793) projected
  line L2 (152.2186, 54.6793) -> (158.5686, 54.6793) projected
  line L3 (158.5686, 54.6793) -> (158.5686, 48.3293) projected
  line L4 (120.65, 63.5) -> (145.3457, 38.8043) projected
  line L5 (145.3457, 38.8043) -> (302.8387, 38.8043) projected
  line L6 (302.8387, 38.8043) -> (302.8387, 76.2) projected
  line L7 (28.575, 371.475) -> (276.225, 371.475) projected
  line L8 (302.8387, 61.0293) -> (123.1207, 61.0293)
  dimension "d182" = 22.225
extrude "Extrusion23" cut sketch "Sketch23" against normal blind 6.35
sketch "Sketch24" plane through (0, 6.35, 0) normal (0, 1, 0) x (1, 0, 0)
  line L0 (276.225, 127) -> (276.225, 101.6) projected
  line L1 (276.225, 101.6) -> (98.425, 101.6) projected
  line L2 (98.425, 101.6) -> (98.425, 127) projected
  line L3 (98.425, 127) -> (276.225, 127) projected
extrude "Extrusion24" add sketch "Sketch24" against normal blind 6.35
sketch "Sketch25" plane through (0, 6.35, 0) normal (0, 1, 0) x (1, 0, 0)
  line L0 (295.275, 222.25) -> (28.575, 222.25) projected
  line L1 (295.275, 209.55) -> (295.275, 180.975) projected
  line L2 (28.575, 209.55) -> (295.275, 209.55) projected
  line L3 (295.275, 70.5543) -> (288.925, 70.5543) projected
  line L4 (28.575, 209.55) -> (28.575, 222.25)
  line L5 (295.275, 222.25) -> (295.275, 209.55)
extrude "Extrusion25" cut sketch "Sketch25" against normal blind 25.4
properties part number "Runner Rails v2" material "Polycarbonate, Clear"
